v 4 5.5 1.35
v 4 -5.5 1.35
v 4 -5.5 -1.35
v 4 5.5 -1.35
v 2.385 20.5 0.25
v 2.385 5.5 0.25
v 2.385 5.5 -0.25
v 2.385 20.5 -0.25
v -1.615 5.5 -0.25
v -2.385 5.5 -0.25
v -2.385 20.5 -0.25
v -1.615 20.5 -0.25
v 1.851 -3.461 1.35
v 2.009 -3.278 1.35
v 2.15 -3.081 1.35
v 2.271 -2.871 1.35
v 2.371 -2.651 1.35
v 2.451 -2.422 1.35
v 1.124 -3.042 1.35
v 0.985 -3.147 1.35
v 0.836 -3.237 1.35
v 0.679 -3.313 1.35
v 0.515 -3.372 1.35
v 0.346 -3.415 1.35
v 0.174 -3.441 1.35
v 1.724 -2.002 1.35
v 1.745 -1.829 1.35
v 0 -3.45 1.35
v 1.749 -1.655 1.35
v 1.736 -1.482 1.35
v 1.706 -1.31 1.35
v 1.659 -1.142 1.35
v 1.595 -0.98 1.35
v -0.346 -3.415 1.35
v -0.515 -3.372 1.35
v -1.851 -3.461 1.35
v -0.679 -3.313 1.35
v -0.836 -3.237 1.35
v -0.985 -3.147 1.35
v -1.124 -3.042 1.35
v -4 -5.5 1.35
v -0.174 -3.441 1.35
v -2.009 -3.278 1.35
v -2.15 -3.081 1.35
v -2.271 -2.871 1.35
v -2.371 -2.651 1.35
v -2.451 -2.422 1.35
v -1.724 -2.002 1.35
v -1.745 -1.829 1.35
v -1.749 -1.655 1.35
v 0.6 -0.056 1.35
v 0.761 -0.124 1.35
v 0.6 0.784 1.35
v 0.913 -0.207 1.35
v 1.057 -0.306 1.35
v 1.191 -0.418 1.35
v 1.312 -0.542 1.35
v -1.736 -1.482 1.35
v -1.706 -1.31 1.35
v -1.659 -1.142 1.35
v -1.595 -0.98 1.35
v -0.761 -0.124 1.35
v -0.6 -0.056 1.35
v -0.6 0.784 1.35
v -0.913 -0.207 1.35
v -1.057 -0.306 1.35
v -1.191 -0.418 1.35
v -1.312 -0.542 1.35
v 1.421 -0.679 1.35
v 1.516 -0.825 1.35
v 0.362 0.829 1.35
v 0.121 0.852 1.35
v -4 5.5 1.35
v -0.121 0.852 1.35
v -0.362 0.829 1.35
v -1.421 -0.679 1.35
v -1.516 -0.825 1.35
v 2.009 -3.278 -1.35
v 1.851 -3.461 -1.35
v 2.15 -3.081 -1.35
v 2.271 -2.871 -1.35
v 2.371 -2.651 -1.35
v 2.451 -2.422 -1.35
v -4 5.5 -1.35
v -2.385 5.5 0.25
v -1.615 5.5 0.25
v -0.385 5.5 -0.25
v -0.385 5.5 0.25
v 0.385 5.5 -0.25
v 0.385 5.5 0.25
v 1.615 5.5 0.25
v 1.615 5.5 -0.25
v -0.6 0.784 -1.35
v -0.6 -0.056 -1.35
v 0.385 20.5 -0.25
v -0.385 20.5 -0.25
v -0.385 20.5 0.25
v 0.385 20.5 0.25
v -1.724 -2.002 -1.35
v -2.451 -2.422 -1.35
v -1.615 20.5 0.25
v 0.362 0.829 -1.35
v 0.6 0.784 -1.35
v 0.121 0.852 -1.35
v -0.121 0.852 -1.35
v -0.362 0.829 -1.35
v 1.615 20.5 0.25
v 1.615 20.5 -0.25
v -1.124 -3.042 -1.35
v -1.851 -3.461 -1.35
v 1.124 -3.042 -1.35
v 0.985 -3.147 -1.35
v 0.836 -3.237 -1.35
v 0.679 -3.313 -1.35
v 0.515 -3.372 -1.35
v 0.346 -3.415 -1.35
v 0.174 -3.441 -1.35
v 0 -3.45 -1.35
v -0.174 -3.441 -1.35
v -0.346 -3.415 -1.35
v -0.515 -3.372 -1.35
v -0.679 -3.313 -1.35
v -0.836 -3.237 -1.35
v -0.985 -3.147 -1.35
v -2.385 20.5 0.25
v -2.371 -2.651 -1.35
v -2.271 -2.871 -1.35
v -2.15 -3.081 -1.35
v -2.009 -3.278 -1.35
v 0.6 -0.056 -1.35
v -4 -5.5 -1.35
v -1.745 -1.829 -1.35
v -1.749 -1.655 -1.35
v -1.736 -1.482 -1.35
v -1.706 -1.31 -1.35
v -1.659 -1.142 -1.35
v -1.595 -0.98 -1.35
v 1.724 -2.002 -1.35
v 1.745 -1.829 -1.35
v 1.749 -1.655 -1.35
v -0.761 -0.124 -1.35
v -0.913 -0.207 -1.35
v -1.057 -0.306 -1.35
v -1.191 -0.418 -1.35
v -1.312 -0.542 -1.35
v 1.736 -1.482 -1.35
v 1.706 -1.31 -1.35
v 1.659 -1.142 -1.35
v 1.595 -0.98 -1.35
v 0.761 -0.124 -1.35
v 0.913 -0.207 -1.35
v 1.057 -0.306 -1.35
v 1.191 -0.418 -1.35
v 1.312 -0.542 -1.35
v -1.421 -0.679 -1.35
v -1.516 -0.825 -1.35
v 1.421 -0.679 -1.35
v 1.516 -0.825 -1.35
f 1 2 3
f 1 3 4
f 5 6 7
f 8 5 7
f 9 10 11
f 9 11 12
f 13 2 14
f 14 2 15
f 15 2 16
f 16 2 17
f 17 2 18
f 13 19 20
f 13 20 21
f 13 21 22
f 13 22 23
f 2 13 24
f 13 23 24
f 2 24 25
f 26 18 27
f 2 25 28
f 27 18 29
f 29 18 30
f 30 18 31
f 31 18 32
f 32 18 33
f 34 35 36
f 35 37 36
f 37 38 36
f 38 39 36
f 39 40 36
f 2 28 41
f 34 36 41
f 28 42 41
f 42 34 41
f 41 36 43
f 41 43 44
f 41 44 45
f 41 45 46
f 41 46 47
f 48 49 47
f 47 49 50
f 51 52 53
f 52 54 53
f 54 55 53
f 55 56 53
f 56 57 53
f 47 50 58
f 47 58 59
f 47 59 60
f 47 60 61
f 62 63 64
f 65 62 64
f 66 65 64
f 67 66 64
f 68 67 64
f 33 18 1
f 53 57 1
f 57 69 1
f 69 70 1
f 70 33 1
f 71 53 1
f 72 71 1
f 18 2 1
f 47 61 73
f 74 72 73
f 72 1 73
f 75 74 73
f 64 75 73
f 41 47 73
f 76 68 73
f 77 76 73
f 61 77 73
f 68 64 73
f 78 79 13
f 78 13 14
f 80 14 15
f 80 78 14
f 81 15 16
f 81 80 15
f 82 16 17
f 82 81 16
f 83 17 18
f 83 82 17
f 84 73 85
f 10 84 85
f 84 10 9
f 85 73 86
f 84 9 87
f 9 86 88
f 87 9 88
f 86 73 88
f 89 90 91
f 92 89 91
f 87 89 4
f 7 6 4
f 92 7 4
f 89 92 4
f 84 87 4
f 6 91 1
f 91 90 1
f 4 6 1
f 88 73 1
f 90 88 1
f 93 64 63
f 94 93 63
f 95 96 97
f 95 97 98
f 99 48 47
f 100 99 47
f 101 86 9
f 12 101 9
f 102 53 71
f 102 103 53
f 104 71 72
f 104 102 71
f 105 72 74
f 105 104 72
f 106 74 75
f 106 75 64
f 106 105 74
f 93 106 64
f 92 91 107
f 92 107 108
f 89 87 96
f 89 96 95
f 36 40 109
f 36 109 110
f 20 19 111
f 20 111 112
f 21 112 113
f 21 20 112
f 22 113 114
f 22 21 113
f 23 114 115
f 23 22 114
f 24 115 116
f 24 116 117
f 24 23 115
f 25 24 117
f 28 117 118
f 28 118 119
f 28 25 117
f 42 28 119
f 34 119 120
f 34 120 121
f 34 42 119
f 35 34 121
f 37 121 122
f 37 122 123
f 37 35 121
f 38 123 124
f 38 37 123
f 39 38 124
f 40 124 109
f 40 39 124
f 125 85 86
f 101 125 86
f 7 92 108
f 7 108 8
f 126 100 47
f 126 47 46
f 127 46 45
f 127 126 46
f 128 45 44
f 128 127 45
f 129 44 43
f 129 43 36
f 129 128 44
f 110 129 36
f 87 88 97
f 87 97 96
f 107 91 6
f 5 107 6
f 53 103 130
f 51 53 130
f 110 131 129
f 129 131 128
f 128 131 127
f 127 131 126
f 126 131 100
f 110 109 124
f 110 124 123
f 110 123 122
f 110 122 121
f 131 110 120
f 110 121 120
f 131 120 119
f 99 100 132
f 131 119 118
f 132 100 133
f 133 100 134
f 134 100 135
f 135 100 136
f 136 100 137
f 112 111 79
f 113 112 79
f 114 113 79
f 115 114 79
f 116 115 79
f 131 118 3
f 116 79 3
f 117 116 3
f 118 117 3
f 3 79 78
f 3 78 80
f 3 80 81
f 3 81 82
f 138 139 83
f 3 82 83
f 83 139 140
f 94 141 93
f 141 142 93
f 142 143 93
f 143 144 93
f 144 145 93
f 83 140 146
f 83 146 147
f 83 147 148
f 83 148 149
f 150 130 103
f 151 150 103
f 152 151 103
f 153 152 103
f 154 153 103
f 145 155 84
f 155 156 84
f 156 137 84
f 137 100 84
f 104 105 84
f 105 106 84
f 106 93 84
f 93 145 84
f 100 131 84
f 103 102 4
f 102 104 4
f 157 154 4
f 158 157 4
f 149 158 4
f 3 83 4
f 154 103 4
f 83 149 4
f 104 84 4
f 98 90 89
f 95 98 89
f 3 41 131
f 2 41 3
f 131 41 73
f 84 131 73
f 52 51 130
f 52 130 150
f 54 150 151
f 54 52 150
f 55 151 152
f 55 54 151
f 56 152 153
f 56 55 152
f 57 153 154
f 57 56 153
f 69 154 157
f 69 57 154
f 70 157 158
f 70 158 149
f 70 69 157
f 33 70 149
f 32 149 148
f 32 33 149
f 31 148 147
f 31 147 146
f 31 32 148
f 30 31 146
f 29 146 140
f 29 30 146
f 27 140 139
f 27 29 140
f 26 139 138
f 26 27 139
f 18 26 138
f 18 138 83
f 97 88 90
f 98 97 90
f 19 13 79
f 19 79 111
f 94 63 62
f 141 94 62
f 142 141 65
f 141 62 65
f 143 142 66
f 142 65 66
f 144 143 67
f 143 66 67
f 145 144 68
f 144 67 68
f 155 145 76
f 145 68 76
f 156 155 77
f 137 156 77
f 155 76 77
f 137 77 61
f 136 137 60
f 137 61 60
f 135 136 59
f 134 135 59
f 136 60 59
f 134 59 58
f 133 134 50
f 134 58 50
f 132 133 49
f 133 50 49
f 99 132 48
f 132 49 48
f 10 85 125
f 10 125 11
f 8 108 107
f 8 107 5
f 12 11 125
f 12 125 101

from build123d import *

# Parameters (mm, degrees)
SKETCH1_W           = 8
SKETCH1_H           = 11
SKETCH1_R           = 2.555
BOSS_EXTRUDE1_DEPTH = 1.35
SKETCH2_W           = 0.77
SKETCH2_H           = 0.5
BOSS_EXTRUDE2_DEPTH = 15
BOSS_EXTRUDE3_DEPTH = 2.7


with BuildPart() as part:
    # Sketch1 → Boss-Extrude1 (new, symmetric)
    with BuildSketch(Plane.XY):
        Rectangle(SKETCH1_W, SKETCH1_H)
        with Locations(Location((0, -1.7, 0), (0, 0, 180))):
            Circle(SKETCH1_R, mode=Mode.SUBTRACT)
    extrude(amount=BOSS_EXTRUDE1_DEPTH, both=True)

    # Sketch2 → Boss-Extrude2 (add)
    with BuildSketch(Plane(origin=(0, 5.5, 0), x_dir=(1, 0, 0), z_dir=(0, 1, 0))):
        Rectangle(SKETCH2_W, SKETCH2_H)
        with Locations((-2, 0)):
            Rectangle(SKETCH2_W, SKETCH2_H)
        with Locations((2, 0)):
            Rectangle(SKETCH2_W, SKETCH2_H)
    extrude(amount=BOSS_EXTRUDE2_DEPTH)

    # Sketch4 → Boss-Extrude3 (add)
    with BuildSketch(Plane.XY.offset(1.35)):
        with BuildLine():
            Line((-0.6, 0.823242633), (-0.6, -0.056071778))
            ThreePointArc((-0.6, -0.056071778), (-1.515544457, -0.825), (-1.723683602, -2.002348869))
            Line((-1.723683602, -2.002348869), (-2.48519222, -2.442006074))
            ThreePointArc((-2.48519222, -2.442006074), (-2.246122223, -0.40320073), (-0.6, 0.823242633))
        make_face()
        with BuildLine():
            Line((0.6, 0.823242633), (0.6, -0.056071778))
            ThreePointArc((0.6, -0.056071778), (1.515544457, -0.825), (1.723683602, -2.002348869))
            Line((1.723683602, -2.002348869), (2.48519222, -2.442006074))
            ThreePointArc((2.48519222, -2.442006074), (2.246122223, -0.40320073), (0.6, 0.823242633))
        make_face()
        with BuildLine():
            Line((1.88519222, -3.481236559), (1.123683602, -3.041579353))
            ThreePointArc((1.123683602, -3.041579353), (0, -3.45), (-1.123683602, -3.041579353))
            Line((-1.123683602, -3.041579353), (-1.88519222, -3.481236559))
            ThreePointArc((-1.88519222, -3.481236559), (0, -4.29359854), (1.88519222, -3.481236559))
        make_face()
    extrude(amount=-BOSS_EXTRUDE3_DEPTH)


solid = part.part
